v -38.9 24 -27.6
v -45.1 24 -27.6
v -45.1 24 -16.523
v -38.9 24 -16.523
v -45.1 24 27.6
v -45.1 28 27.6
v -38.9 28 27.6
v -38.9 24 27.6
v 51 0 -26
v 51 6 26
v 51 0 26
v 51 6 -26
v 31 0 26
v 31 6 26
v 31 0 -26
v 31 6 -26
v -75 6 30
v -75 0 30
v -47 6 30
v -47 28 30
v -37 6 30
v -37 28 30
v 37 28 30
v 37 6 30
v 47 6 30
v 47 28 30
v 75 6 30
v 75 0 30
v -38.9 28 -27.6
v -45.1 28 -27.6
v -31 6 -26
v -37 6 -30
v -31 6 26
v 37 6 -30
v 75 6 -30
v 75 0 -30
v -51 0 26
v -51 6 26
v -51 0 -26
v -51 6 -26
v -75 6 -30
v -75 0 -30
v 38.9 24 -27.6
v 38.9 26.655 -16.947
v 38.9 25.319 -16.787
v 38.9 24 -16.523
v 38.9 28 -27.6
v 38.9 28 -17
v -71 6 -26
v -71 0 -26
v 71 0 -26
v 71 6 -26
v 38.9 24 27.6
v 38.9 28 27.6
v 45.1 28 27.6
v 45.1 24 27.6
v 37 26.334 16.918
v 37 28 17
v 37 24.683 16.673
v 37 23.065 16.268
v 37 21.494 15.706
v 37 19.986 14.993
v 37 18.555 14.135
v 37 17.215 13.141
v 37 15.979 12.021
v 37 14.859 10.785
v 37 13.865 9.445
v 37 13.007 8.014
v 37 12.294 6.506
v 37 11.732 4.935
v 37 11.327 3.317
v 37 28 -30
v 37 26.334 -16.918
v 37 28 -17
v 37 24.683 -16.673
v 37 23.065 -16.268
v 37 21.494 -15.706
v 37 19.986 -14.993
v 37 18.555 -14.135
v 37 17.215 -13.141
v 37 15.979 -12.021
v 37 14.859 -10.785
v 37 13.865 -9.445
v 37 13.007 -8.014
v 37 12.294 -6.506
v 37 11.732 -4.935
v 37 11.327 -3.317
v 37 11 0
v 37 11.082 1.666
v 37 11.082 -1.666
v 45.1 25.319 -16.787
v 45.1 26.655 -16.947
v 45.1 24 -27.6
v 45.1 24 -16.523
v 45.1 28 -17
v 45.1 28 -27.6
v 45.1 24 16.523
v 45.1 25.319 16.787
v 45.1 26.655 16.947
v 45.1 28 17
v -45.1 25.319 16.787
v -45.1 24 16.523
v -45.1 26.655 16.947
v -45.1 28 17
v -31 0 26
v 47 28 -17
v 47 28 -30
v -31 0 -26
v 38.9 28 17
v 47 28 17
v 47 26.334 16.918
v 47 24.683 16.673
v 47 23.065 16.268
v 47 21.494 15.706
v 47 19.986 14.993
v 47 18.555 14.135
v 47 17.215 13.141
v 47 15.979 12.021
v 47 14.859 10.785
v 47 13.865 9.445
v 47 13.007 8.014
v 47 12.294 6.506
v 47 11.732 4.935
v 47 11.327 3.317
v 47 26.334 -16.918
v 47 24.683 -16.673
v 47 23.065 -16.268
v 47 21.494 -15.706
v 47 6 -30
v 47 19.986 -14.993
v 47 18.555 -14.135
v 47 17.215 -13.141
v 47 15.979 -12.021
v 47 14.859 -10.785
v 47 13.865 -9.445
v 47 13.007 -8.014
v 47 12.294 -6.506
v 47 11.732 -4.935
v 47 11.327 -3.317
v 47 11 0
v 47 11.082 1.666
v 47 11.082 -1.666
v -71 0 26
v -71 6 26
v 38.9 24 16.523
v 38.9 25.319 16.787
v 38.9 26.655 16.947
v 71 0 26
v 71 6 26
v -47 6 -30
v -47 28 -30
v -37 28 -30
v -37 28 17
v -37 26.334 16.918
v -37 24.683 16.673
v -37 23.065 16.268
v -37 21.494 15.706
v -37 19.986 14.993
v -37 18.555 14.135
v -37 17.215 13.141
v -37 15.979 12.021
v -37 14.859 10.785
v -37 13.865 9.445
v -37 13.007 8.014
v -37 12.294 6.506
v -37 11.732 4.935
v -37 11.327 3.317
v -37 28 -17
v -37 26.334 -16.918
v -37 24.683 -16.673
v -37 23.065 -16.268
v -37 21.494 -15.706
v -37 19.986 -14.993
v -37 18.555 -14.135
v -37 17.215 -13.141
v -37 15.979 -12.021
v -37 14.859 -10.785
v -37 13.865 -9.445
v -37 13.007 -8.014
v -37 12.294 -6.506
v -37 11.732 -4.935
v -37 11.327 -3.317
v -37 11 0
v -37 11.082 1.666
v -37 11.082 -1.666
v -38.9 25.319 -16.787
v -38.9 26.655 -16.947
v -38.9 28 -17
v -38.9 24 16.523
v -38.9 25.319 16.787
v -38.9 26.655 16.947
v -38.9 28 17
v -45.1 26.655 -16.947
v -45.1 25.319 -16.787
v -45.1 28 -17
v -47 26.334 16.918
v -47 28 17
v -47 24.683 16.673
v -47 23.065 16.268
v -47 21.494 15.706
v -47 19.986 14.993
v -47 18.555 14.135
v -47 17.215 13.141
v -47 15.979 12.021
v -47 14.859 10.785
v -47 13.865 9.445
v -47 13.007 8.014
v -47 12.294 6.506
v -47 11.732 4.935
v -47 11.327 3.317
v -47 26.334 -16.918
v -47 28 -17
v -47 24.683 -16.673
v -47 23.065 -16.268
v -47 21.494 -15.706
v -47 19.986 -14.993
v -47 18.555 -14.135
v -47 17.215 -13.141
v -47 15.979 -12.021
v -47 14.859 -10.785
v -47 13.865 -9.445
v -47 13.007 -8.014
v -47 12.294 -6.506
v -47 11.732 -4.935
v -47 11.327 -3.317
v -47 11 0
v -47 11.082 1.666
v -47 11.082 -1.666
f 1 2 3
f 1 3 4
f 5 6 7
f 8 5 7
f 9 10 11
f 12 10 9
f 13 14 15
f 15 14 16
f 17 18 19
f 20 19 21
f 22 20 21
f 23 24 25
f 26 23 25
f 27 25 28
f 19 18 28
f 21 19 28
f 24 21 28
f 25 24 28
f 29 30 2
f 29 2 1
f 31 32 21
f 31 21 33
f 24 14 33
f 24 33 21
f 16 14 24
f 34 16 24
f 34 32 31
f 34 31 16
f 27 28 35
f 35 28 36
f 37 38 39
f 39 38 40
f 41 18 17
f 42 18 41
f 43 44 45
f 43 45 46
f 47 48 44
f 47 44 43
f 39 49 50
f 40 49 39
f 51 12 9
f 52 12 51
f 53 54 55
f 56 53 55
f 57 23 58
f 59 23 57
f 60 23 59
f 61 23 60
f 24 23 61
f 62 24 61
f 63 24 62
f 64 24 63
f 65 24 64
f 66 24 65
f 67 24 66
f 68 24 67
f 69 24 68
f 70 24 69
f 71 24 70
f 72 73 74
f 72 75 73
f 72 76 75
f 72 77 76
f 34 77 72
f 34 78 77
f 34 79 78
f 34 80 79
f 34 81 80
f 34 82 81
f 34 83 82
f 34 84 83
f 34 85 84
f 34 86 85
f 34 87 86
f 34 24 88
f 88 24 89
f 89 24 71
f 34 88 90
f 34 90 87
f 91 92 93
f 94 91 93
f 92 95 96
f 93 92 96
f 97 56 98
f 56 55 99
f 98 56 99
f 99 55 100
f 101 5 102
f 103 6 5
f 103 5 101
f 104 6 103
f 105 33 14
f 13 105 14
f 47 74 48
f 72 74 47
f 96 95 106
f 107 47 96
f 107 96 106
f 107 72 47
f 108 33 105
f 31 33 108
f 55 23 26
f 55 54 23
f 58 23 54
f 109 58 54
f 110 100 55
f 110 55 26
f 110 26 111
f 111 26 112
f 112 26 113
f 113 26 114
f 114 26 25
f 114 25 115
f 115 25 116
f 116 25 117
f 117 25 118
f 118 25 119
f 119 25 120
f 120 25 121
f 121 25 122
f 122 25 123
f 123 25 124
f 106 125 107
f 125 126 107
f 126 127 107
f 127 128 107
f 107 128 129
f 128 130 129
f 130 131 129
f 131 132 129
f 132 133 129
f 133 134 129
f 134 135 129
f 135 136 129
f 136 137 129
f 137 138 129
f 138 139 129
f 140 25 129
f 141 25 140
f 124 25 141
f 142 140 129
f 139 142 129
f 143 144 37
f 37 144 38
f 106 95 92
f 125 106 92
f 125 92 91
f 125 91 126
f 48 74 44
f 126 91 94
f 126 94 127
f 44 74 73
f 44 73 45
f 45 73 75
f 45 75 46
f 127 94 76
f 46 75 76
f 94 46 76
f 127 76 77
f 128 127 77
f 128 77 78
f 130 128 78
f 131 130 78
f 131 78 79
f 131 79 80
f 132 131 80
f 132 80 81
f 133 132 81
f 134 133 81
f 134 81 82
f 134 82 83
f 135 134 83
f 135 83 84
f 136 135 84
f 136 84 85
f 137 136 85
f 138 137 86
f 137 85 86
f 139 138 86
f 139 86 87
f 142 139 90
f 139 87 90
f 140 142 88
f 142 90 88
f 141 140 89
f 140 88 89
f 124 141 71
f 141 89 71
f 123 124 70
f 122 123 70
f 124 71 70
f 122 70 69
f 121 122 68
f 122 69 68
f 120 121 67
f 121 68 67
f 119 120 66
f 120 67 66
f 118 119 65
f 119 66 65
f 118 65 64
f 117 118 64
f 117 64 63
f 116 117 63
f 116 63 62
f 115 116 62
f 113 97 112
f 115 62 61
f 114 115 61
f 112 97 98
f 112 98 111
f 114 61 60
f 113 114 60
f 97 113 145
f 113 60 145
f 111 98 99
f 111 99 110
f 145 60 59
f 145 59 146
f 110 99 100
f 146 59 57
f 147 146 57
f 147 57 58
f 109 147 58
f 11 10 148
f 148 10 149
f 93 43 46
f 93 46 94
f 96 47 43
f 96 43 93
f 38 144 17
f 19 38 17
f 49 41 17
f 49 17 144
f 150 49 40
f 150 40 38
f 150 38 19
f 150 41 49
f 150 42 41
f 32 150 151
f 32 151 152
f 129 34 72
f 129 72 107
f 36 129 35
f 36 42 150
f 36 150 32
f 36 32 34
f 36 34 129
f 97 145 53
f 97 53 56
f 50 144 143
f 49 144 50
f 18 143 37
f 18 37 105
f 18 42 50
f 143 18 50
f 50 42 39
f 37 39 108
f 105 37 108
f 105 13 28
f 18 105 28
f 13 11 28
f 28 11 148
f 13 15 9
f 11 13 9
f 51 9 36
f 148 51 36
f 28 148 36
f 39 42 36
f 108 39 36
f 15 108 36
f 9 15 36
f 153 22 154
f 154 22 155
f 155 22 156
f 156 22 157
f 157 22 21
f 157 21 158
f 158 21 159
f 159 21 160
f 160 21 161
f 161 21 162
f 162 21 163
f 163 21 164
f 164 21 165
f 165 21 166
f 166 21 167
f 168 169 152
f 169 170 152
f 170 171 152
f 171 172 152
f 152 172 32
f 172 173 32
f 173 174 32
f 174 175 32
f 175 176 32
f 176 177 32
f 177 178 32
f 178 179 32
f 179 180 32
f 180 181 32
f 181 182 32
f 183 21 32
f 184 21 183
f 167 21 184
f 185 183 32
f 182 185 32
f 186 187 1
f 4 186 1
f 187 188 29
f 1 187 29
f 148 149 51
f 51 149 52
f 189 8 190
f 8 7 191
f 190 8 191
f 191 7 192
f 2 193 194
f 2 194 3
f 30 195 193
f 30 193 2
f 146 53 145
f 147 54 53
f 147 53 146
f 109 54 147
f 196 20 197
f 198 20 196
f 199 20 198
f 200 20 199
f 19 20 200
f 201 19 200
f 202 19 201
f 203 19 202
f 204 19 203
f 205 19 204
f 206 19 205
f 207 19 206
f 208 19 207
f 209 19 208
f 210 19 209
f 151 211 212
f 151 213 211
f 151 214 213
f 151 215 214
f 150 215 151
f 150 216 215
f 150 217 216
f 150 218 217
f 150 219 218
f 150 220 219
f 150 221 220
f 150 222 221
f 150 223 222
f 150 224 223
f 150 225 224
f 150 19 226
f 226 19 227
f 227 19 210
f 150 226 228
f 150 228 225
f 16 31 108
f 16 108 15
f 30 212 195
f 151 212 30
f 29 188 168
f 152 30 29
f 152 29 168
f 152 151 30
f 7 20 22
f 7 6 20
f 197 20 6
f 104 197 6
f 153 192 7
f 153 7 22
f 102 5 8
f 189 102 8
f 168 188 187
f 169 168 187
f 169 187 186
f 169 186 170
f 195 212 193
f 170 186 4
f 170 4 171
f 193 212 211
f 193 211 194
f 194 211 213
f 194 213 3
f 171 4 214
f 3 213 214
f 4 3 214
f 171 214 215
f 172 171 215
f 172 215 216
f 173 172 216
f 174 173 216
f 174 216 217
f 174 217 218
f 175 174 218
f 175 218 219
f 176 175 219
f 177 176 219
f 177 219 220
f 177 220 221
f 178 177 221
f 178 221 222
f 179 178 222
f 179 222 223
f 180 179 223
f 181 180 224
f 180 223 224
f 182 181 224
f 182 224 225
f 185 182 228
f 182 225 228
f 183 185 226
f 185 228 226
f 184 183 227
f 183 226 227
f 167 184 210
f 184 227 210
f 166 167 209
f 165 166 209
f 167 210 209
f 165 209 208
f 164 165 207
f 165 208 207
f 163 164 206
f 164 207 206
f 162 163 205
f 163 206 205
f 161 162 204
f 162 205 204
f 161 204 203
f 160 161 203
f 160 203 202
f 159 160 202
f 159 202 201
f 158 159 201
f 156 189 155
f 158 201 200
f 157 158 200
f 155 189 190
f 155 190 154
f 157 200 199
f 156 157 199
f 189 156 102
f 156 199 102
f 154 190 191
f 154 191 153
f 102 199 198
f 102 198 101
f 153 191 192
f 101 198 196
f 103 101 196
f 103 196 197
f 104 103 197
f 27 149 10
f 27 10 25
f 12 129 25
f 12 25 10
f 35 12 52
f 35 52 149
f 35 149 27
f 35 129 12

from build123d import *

# Parameters (mm, degrees)
SKETCH_1_W          = 150
SKETCH_1_H          = 60
EXTRUDE_1_DEPTH     = 6
SKETCH_2_W          = 10
SKETCH_2_H          = 60
EXTRUDE_2_DEPTH     = 22
SKETCH_3_W          = 6.2
SKETCH_3_H          = 55.2
CUT_EXTRUDE_1_DEPTH = 4
SKETCH_4_R          = 17
CUT_EXTRUDE_2_DEPTH = 129.716743278
SKETCH_5_W          = 20
SKETCH_5_H          = 52
SKETCH_5_W_2        = 62
CUT_EXTRUDE_3_DEPTH = 84.719770664


with BuildPart() as part:
    # 草图1 → 凸台-拉伸1 (new body)
    with BuildSketch(Plane(origin=(0, 0, 0), x_dir=(1, 0, 0), z_dir=(0, 1, 0))):
        Rectangle(SKETCH_1_W, SKETCH_1_H)
    extrude(amount=EXTRUDE_1_DEPTH)

    # 草图2 → 凸台-拉伸2 (add)
    with BuildSketch(Plane(origin=(0, 6, 0), x_dir=(1, 0, 0), z_dir=(0, 1, 0))):
        with Locations((-42, 0)):
            Rectangle(SKETCH_2_W, SKETCH_2_H)
        with Locations((42, 0)):
            Rectangle(SKETCH_2_W, SKETCH_2_H)
    extrude(amount=EXTRUDE_2_DEPTH)

    # 草图3 → 切除-拉伸1 (cut)
    with BuildSketch(Plane(origin=(0, 28, 0), x_dir=(1, 0, 0), z_dir=(0, 1, 0))):
        with Locations((-42, 0)):
            Rectangle(SKETCH_3_W, SKETCH_3_H)
        with Locations((42, 0)):
            Rectangle(SKETCH_3_W, SKETCH_3_H)
    extrude(amount=-CUT_EXTRUDE_1_DEPTH, mode=Mode.SUBTRACT)

    # 草图4 → 切除-拉伸2 (cut, through all)
    with BuildSketch(Plane.ZY.offset(47)):
        with Locations((0, 28)):
            Circle(SKETCH_4_R)
    extrude(amount=-CUT_EXTRUDE_2_DEPTH, mode=Mode.SUBTRACT)

    # 草图5 → 切除-拉伸3 (cut, through all)
    with BuildSketch(Plane(origin=(0, 6, 0), x_dir=(1, 0, 0), z_dir=(0, 1, 0))):
        with Locations((-61, 0)):
            Rectangle(SKETCH_5_W, SKETCH_5_H)
        with Locations((61, 0)):
            Rectangle(SKETCH_5_W, SKETCH_5_H)
        Rectangle(SKETCH_5_W_2, SKETCH_5_H)
    extrude(amount=-CUT_EXTRUDE_3_DEPTH, mode=Mode.SUBTRACT)


solid = part.part
